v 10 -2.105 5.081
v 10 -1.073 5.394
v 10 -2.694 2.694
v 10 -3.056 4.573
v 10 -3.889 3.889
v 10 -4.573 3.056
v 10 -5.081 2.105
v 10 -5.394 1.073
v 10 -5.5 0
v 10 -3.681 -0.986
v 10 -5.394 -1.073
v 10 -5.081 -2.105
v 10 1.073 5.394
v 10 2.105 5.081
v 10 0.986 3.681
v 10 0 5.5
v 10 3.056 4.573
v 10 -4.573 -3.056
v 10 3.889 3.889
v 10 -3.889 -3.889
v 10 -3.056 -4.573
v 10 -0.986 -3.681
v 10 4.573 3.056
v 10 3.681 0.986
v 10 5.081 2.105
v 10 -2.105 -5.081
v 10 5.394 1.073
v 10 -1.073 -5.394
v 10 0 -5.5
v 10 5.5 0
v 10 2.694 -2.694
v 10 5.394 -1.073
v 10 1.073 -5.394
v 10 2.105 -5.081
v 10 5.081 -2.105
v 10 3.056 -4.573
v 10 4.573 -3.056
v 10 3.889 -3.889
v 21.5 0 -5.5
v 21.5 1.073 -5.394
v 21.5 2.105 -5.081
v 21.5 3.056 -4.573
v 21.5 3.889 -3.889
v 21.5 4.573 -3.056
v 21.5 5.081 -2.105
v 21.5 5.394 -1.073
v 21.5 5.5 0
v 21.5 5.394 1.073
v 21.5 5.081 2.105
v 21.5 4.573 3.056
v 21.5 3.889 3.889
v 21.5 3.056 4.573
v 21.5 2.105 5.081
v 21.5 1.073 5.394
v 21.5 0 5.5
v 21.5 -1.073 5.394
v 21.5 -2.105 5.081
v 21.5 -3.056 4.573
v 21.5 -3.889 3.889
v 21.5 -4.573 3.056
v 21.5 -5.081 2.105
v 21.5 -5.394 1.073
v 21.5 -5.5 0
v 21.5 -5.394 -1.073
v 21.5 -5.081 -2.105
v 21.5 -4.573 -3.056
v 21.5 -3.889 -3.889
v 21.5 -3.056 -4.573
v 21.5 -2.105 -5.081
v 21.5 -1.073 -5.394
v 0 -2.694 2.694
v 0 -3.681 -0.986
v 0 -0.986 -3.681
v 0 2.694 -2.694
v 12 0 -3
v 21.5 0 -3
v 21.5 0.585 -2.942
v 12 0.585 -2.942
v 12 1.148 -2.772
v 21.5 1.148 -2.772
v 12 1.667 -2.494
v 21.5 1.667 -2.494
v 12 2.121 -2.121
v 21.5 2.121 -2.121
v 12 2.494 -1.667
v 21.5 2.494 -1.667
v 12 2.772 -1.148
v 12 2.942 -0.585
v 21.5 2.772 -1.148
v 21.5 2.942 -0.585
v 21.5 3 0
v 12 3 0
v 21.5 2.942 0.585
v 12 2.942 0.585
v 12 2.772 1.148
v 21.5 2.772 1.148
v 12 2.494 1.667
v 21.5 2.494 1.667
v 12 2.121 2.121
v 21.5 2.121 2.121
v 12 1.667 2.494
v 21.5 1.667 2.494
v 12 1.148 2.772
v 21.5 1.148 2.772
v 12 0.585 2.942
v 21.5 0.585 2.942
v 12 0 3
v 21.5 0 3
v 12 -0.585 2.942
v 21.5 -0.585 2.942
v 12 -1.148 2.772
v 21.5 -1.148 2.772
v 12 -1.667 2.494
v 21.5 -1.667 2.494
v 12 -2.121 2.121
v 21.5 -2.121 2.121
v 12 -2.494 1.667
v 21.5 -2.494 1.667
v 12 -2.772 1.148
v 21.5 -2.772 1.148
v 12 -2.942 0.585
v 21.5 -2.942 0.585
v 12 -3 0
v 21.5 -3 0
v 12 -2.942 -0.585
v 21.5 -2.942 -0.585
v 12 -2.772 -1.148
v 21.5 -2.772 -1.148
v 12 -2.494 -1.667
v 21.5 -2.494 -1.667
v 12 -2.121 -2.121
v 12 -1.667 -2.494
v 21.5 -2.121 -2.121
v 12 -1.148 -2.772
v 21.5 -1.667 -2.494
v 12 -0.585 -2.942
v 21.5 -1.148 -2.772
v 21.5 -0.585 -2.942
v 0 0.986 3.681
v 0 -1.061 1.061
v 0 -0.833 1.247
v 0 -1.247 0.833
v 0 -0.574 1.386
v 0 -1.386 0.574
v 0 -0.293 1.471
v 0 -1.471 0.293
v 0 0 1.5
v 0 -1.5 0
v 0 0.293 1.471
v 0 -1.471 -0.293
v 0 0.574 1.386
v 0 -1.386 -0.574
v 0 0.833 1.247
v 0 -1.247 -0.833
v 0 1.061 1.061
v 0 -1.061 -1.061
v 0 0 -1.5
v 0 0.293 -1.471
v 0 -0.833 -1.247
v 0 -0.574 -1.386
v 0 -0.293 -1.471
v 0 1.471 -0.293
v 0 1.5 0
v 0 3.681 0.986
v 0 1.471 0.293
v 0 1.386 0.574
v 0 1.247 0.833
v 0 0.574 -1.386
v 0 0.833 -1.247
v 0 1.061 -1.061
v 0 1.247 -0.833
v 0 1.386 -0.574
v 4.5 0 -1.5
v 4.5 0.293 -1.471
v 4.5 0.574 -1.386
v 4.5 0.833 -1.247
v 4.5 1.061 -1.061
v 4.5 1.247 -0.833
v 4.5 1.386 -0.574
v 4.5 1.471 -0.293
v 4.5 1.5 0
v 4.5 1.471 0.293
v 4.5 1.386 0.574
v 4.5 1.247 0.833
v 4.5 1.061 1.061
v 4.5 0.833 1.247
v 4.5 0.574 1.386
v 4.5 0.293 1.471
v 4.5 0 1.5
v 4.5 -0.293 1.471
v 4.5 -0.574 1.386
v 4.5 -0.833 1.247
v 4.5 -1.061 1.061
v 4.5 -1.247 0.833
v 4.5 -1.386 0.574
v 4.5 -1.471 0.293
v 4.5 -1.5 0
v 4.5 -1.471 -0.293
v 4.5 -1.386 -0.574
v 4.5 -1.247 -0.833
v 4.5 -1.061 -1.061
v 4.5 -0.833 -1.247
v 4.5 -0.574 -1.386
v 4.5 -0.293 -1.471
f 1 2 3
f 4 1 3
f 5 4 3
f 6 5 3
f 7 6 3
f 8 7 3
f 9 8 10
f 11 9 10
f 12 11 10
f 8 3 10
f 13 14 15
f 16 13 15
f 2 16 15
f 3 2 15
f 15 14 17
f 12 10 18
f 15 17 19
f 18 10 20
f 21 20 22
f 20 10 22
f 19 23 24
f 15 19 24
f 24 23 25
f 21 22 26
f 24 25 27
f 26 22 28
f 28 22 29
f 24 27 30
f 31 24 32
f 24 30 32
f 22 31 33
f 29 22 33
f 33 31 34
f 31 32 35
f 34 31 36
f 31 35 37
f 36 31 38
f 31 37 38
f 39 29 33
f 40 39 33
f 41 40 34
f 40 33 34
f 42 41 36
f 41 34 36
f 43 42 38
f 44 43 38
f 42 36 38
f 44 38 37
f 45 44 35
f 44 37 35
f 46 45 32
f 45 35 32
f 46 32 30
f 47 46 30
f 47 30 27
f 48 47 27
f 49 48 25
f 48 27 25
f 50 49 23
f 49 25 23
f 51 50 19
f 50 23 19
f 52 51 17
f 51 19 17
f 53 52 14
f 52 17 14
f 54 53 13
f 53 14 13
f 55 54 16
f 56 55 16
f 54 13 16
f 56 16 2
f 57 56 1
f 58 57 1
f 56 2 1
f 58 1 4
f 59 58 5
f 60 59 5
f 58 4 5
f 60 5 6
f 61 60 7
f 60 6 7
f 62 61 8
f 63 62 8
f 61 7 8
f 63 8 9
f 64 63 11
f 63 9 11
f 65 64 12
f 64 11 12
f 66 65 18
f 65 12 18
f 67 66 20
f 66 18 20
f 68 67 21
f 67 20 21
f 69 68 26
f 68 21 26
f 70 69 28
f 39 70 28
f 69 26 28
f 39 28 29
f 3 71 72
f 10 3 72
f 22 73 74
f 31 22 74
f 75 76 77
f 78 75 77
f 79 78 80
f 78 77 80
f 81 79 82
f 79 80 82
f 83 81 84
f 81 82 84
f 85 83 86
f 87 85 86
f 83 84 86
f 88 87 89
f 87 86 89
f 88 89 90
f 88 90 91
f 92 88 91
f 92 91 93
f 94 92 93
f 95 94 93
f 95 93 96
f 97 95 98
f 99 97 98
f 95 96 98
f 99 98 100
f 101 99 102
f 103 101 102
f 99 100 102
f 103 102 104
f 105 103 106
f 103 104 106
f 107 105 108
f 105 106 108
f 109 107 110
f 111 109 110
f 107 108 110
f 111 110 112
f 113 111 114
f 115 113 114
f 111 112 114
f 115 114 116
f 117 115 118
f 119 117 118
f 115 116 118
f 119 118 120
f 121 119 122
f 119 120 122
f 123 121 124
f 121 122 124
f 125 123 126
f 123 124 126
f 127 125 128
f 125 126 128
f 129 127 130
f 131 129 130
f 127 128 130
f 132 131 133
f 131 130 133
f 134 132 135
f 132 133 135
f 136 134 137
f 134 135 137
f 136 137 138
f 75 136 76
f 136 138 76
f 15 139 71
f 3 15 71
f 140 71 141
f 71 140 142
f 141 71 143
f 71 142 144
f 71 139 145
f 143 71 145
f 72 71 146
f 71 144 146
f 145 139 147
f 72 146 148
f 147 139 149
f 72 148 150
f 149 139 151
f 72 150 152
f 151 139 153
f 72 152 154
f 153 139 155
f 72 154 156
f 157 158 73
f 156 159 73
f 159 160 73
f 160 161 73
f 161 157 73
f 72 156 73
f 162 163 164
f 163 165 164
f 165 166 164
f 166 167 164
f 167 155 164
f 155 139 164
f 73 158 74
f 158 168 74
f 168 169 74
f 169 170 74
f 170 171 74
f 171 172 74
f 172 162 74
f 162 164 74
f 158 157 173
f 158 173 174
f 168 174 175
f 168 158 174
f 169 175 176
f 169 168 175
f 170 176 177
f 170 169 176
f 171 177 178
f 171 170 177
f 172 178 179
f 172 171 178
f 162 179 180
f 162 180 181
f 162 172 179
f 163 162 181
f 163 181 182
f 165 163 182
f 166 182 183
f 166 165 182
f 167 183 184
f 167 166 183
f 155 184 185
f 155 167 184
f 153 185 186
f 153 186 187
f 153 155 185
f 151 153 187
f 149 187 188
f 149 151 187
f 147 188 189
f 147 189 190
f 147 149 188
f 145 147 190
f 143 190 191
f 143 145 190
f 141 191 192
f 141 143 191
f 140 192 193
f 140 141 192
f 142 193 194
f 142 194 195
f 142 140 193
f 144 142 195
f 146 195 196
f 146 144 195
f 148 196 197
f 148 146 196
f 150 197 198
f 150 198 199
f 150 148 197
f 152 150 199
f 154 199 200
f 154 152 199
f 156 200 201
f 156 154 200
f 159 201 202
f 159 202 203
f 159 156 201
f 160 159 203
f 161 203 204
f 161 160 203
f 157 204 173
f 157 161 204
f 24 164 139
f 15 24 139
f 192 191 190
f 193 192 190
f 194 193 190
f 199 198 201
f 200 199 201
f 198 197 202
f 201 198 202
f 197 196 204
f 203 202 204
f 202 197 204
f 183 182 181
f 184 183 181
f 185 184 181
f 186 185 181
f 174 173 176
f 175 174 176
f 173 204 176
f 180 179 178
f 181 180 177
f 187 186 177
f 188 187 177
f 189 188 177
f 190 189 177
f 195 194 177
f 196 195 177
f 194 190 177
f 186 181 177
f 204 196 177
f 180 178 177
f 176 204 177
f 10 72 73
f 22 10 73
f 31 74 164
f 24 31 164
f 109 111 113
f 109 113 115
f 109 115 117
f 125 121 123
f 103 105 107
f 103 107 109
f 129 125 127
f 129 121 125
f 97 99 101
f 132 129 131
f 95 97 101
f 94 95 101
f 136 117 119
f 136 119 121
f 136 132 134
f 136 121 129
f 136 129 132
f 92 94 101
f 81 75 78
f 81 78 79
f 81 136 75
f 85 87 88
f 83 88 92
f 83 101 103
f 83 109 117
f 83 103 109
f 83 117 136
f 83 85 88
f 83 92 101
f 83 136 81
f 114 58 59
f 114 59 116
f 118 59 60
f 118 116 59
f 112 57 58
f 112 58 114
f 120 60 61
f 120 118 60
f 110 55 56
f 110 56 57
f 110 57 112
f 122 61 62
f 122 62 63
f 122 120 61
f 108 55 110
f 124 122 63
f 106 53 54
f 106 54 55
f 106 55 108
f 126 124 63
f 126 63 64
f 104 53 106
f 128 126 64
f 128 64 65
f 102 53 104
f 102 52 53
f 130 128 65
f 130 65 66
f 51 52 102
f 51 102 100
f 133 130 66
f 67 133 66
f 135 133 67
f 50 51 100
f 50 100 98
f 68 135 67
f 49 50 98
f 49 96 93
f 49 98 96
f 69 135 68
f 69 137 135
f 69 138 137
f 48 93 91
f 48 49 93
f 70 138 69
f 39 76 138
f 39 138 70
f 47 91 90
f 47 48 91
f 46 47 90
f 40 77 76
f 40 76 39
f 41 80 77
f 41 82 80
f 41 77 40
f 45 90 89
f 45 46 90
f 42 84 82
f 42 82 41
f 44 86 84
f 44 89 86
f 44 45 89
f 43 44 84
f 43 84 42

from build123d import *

# Parameters (mm, degrees)
EXTRUDE_1_DEPTH     = 10
SKETCH_2_3_R        = 1.5
CUT_EXTRUDE_1_DEPTH = 4.5
SKETCH_3_R          = 5.5
EXTRUDE_2_DEPTH     = 11.5
SKETCH_4_R          = 3
CUT_EXTRUDE_2_DEPTH = 9.5


with BuildPart() as part:
    # 草图2 → 凸台-拉伸1 (new body)
    with BuildSketch(Plane(origin=(0, 0, 0), x_dir=(0, 0, -1), z_dir=(1, 0, 0))):
        Polygon((3.680671736, -0.986233019), (2.694438717, 2.694438717), (-0.986233019, 3.680671736), (-3.680671736, 0.986233019), (-2.694438717, -2.694438717), (0.986233019, -3.680671736), align=None)
    extrude(amount=EXTRUDE_1_DEPTH)

    # 草图2<3> → 切除-拉伸1 (cut)
    with BuildSketch(Plane(origin=(0, 0, 0), x_dir=(0, 0, -1), z_dir=(1, 0, 0))):
        Circle(SKETCH_2_3_R)
    extrude(amount=CUT_EXTRUDE_1_DEPTH, mode=Mode.SUBTRACT)

    # 草图3 → 凸台-拉伸2 (add)
    with BuildSketch(Plane(origin=(10, 0, 0), x_dir=(0, 0, -1), z_dir=(1, 0, 0))):
        Circle(SKETCH_3_R)
    extrude(amount=EXTRUDE_2_DEPTH)

    # 草图4 → 切除-拉伸2 (cut)
    with BuildSketch(Plane(origin=(21.5, 0, 0), x_dir=(0, 0, -1), z_dir=(1, 0, 0))):
        Circle(SKETCH_4_R)
    extrude(amount=-CUT_EXTRUDE_2_DEPTH, mode=Mode.SUBTRACT)


solid = part.part
